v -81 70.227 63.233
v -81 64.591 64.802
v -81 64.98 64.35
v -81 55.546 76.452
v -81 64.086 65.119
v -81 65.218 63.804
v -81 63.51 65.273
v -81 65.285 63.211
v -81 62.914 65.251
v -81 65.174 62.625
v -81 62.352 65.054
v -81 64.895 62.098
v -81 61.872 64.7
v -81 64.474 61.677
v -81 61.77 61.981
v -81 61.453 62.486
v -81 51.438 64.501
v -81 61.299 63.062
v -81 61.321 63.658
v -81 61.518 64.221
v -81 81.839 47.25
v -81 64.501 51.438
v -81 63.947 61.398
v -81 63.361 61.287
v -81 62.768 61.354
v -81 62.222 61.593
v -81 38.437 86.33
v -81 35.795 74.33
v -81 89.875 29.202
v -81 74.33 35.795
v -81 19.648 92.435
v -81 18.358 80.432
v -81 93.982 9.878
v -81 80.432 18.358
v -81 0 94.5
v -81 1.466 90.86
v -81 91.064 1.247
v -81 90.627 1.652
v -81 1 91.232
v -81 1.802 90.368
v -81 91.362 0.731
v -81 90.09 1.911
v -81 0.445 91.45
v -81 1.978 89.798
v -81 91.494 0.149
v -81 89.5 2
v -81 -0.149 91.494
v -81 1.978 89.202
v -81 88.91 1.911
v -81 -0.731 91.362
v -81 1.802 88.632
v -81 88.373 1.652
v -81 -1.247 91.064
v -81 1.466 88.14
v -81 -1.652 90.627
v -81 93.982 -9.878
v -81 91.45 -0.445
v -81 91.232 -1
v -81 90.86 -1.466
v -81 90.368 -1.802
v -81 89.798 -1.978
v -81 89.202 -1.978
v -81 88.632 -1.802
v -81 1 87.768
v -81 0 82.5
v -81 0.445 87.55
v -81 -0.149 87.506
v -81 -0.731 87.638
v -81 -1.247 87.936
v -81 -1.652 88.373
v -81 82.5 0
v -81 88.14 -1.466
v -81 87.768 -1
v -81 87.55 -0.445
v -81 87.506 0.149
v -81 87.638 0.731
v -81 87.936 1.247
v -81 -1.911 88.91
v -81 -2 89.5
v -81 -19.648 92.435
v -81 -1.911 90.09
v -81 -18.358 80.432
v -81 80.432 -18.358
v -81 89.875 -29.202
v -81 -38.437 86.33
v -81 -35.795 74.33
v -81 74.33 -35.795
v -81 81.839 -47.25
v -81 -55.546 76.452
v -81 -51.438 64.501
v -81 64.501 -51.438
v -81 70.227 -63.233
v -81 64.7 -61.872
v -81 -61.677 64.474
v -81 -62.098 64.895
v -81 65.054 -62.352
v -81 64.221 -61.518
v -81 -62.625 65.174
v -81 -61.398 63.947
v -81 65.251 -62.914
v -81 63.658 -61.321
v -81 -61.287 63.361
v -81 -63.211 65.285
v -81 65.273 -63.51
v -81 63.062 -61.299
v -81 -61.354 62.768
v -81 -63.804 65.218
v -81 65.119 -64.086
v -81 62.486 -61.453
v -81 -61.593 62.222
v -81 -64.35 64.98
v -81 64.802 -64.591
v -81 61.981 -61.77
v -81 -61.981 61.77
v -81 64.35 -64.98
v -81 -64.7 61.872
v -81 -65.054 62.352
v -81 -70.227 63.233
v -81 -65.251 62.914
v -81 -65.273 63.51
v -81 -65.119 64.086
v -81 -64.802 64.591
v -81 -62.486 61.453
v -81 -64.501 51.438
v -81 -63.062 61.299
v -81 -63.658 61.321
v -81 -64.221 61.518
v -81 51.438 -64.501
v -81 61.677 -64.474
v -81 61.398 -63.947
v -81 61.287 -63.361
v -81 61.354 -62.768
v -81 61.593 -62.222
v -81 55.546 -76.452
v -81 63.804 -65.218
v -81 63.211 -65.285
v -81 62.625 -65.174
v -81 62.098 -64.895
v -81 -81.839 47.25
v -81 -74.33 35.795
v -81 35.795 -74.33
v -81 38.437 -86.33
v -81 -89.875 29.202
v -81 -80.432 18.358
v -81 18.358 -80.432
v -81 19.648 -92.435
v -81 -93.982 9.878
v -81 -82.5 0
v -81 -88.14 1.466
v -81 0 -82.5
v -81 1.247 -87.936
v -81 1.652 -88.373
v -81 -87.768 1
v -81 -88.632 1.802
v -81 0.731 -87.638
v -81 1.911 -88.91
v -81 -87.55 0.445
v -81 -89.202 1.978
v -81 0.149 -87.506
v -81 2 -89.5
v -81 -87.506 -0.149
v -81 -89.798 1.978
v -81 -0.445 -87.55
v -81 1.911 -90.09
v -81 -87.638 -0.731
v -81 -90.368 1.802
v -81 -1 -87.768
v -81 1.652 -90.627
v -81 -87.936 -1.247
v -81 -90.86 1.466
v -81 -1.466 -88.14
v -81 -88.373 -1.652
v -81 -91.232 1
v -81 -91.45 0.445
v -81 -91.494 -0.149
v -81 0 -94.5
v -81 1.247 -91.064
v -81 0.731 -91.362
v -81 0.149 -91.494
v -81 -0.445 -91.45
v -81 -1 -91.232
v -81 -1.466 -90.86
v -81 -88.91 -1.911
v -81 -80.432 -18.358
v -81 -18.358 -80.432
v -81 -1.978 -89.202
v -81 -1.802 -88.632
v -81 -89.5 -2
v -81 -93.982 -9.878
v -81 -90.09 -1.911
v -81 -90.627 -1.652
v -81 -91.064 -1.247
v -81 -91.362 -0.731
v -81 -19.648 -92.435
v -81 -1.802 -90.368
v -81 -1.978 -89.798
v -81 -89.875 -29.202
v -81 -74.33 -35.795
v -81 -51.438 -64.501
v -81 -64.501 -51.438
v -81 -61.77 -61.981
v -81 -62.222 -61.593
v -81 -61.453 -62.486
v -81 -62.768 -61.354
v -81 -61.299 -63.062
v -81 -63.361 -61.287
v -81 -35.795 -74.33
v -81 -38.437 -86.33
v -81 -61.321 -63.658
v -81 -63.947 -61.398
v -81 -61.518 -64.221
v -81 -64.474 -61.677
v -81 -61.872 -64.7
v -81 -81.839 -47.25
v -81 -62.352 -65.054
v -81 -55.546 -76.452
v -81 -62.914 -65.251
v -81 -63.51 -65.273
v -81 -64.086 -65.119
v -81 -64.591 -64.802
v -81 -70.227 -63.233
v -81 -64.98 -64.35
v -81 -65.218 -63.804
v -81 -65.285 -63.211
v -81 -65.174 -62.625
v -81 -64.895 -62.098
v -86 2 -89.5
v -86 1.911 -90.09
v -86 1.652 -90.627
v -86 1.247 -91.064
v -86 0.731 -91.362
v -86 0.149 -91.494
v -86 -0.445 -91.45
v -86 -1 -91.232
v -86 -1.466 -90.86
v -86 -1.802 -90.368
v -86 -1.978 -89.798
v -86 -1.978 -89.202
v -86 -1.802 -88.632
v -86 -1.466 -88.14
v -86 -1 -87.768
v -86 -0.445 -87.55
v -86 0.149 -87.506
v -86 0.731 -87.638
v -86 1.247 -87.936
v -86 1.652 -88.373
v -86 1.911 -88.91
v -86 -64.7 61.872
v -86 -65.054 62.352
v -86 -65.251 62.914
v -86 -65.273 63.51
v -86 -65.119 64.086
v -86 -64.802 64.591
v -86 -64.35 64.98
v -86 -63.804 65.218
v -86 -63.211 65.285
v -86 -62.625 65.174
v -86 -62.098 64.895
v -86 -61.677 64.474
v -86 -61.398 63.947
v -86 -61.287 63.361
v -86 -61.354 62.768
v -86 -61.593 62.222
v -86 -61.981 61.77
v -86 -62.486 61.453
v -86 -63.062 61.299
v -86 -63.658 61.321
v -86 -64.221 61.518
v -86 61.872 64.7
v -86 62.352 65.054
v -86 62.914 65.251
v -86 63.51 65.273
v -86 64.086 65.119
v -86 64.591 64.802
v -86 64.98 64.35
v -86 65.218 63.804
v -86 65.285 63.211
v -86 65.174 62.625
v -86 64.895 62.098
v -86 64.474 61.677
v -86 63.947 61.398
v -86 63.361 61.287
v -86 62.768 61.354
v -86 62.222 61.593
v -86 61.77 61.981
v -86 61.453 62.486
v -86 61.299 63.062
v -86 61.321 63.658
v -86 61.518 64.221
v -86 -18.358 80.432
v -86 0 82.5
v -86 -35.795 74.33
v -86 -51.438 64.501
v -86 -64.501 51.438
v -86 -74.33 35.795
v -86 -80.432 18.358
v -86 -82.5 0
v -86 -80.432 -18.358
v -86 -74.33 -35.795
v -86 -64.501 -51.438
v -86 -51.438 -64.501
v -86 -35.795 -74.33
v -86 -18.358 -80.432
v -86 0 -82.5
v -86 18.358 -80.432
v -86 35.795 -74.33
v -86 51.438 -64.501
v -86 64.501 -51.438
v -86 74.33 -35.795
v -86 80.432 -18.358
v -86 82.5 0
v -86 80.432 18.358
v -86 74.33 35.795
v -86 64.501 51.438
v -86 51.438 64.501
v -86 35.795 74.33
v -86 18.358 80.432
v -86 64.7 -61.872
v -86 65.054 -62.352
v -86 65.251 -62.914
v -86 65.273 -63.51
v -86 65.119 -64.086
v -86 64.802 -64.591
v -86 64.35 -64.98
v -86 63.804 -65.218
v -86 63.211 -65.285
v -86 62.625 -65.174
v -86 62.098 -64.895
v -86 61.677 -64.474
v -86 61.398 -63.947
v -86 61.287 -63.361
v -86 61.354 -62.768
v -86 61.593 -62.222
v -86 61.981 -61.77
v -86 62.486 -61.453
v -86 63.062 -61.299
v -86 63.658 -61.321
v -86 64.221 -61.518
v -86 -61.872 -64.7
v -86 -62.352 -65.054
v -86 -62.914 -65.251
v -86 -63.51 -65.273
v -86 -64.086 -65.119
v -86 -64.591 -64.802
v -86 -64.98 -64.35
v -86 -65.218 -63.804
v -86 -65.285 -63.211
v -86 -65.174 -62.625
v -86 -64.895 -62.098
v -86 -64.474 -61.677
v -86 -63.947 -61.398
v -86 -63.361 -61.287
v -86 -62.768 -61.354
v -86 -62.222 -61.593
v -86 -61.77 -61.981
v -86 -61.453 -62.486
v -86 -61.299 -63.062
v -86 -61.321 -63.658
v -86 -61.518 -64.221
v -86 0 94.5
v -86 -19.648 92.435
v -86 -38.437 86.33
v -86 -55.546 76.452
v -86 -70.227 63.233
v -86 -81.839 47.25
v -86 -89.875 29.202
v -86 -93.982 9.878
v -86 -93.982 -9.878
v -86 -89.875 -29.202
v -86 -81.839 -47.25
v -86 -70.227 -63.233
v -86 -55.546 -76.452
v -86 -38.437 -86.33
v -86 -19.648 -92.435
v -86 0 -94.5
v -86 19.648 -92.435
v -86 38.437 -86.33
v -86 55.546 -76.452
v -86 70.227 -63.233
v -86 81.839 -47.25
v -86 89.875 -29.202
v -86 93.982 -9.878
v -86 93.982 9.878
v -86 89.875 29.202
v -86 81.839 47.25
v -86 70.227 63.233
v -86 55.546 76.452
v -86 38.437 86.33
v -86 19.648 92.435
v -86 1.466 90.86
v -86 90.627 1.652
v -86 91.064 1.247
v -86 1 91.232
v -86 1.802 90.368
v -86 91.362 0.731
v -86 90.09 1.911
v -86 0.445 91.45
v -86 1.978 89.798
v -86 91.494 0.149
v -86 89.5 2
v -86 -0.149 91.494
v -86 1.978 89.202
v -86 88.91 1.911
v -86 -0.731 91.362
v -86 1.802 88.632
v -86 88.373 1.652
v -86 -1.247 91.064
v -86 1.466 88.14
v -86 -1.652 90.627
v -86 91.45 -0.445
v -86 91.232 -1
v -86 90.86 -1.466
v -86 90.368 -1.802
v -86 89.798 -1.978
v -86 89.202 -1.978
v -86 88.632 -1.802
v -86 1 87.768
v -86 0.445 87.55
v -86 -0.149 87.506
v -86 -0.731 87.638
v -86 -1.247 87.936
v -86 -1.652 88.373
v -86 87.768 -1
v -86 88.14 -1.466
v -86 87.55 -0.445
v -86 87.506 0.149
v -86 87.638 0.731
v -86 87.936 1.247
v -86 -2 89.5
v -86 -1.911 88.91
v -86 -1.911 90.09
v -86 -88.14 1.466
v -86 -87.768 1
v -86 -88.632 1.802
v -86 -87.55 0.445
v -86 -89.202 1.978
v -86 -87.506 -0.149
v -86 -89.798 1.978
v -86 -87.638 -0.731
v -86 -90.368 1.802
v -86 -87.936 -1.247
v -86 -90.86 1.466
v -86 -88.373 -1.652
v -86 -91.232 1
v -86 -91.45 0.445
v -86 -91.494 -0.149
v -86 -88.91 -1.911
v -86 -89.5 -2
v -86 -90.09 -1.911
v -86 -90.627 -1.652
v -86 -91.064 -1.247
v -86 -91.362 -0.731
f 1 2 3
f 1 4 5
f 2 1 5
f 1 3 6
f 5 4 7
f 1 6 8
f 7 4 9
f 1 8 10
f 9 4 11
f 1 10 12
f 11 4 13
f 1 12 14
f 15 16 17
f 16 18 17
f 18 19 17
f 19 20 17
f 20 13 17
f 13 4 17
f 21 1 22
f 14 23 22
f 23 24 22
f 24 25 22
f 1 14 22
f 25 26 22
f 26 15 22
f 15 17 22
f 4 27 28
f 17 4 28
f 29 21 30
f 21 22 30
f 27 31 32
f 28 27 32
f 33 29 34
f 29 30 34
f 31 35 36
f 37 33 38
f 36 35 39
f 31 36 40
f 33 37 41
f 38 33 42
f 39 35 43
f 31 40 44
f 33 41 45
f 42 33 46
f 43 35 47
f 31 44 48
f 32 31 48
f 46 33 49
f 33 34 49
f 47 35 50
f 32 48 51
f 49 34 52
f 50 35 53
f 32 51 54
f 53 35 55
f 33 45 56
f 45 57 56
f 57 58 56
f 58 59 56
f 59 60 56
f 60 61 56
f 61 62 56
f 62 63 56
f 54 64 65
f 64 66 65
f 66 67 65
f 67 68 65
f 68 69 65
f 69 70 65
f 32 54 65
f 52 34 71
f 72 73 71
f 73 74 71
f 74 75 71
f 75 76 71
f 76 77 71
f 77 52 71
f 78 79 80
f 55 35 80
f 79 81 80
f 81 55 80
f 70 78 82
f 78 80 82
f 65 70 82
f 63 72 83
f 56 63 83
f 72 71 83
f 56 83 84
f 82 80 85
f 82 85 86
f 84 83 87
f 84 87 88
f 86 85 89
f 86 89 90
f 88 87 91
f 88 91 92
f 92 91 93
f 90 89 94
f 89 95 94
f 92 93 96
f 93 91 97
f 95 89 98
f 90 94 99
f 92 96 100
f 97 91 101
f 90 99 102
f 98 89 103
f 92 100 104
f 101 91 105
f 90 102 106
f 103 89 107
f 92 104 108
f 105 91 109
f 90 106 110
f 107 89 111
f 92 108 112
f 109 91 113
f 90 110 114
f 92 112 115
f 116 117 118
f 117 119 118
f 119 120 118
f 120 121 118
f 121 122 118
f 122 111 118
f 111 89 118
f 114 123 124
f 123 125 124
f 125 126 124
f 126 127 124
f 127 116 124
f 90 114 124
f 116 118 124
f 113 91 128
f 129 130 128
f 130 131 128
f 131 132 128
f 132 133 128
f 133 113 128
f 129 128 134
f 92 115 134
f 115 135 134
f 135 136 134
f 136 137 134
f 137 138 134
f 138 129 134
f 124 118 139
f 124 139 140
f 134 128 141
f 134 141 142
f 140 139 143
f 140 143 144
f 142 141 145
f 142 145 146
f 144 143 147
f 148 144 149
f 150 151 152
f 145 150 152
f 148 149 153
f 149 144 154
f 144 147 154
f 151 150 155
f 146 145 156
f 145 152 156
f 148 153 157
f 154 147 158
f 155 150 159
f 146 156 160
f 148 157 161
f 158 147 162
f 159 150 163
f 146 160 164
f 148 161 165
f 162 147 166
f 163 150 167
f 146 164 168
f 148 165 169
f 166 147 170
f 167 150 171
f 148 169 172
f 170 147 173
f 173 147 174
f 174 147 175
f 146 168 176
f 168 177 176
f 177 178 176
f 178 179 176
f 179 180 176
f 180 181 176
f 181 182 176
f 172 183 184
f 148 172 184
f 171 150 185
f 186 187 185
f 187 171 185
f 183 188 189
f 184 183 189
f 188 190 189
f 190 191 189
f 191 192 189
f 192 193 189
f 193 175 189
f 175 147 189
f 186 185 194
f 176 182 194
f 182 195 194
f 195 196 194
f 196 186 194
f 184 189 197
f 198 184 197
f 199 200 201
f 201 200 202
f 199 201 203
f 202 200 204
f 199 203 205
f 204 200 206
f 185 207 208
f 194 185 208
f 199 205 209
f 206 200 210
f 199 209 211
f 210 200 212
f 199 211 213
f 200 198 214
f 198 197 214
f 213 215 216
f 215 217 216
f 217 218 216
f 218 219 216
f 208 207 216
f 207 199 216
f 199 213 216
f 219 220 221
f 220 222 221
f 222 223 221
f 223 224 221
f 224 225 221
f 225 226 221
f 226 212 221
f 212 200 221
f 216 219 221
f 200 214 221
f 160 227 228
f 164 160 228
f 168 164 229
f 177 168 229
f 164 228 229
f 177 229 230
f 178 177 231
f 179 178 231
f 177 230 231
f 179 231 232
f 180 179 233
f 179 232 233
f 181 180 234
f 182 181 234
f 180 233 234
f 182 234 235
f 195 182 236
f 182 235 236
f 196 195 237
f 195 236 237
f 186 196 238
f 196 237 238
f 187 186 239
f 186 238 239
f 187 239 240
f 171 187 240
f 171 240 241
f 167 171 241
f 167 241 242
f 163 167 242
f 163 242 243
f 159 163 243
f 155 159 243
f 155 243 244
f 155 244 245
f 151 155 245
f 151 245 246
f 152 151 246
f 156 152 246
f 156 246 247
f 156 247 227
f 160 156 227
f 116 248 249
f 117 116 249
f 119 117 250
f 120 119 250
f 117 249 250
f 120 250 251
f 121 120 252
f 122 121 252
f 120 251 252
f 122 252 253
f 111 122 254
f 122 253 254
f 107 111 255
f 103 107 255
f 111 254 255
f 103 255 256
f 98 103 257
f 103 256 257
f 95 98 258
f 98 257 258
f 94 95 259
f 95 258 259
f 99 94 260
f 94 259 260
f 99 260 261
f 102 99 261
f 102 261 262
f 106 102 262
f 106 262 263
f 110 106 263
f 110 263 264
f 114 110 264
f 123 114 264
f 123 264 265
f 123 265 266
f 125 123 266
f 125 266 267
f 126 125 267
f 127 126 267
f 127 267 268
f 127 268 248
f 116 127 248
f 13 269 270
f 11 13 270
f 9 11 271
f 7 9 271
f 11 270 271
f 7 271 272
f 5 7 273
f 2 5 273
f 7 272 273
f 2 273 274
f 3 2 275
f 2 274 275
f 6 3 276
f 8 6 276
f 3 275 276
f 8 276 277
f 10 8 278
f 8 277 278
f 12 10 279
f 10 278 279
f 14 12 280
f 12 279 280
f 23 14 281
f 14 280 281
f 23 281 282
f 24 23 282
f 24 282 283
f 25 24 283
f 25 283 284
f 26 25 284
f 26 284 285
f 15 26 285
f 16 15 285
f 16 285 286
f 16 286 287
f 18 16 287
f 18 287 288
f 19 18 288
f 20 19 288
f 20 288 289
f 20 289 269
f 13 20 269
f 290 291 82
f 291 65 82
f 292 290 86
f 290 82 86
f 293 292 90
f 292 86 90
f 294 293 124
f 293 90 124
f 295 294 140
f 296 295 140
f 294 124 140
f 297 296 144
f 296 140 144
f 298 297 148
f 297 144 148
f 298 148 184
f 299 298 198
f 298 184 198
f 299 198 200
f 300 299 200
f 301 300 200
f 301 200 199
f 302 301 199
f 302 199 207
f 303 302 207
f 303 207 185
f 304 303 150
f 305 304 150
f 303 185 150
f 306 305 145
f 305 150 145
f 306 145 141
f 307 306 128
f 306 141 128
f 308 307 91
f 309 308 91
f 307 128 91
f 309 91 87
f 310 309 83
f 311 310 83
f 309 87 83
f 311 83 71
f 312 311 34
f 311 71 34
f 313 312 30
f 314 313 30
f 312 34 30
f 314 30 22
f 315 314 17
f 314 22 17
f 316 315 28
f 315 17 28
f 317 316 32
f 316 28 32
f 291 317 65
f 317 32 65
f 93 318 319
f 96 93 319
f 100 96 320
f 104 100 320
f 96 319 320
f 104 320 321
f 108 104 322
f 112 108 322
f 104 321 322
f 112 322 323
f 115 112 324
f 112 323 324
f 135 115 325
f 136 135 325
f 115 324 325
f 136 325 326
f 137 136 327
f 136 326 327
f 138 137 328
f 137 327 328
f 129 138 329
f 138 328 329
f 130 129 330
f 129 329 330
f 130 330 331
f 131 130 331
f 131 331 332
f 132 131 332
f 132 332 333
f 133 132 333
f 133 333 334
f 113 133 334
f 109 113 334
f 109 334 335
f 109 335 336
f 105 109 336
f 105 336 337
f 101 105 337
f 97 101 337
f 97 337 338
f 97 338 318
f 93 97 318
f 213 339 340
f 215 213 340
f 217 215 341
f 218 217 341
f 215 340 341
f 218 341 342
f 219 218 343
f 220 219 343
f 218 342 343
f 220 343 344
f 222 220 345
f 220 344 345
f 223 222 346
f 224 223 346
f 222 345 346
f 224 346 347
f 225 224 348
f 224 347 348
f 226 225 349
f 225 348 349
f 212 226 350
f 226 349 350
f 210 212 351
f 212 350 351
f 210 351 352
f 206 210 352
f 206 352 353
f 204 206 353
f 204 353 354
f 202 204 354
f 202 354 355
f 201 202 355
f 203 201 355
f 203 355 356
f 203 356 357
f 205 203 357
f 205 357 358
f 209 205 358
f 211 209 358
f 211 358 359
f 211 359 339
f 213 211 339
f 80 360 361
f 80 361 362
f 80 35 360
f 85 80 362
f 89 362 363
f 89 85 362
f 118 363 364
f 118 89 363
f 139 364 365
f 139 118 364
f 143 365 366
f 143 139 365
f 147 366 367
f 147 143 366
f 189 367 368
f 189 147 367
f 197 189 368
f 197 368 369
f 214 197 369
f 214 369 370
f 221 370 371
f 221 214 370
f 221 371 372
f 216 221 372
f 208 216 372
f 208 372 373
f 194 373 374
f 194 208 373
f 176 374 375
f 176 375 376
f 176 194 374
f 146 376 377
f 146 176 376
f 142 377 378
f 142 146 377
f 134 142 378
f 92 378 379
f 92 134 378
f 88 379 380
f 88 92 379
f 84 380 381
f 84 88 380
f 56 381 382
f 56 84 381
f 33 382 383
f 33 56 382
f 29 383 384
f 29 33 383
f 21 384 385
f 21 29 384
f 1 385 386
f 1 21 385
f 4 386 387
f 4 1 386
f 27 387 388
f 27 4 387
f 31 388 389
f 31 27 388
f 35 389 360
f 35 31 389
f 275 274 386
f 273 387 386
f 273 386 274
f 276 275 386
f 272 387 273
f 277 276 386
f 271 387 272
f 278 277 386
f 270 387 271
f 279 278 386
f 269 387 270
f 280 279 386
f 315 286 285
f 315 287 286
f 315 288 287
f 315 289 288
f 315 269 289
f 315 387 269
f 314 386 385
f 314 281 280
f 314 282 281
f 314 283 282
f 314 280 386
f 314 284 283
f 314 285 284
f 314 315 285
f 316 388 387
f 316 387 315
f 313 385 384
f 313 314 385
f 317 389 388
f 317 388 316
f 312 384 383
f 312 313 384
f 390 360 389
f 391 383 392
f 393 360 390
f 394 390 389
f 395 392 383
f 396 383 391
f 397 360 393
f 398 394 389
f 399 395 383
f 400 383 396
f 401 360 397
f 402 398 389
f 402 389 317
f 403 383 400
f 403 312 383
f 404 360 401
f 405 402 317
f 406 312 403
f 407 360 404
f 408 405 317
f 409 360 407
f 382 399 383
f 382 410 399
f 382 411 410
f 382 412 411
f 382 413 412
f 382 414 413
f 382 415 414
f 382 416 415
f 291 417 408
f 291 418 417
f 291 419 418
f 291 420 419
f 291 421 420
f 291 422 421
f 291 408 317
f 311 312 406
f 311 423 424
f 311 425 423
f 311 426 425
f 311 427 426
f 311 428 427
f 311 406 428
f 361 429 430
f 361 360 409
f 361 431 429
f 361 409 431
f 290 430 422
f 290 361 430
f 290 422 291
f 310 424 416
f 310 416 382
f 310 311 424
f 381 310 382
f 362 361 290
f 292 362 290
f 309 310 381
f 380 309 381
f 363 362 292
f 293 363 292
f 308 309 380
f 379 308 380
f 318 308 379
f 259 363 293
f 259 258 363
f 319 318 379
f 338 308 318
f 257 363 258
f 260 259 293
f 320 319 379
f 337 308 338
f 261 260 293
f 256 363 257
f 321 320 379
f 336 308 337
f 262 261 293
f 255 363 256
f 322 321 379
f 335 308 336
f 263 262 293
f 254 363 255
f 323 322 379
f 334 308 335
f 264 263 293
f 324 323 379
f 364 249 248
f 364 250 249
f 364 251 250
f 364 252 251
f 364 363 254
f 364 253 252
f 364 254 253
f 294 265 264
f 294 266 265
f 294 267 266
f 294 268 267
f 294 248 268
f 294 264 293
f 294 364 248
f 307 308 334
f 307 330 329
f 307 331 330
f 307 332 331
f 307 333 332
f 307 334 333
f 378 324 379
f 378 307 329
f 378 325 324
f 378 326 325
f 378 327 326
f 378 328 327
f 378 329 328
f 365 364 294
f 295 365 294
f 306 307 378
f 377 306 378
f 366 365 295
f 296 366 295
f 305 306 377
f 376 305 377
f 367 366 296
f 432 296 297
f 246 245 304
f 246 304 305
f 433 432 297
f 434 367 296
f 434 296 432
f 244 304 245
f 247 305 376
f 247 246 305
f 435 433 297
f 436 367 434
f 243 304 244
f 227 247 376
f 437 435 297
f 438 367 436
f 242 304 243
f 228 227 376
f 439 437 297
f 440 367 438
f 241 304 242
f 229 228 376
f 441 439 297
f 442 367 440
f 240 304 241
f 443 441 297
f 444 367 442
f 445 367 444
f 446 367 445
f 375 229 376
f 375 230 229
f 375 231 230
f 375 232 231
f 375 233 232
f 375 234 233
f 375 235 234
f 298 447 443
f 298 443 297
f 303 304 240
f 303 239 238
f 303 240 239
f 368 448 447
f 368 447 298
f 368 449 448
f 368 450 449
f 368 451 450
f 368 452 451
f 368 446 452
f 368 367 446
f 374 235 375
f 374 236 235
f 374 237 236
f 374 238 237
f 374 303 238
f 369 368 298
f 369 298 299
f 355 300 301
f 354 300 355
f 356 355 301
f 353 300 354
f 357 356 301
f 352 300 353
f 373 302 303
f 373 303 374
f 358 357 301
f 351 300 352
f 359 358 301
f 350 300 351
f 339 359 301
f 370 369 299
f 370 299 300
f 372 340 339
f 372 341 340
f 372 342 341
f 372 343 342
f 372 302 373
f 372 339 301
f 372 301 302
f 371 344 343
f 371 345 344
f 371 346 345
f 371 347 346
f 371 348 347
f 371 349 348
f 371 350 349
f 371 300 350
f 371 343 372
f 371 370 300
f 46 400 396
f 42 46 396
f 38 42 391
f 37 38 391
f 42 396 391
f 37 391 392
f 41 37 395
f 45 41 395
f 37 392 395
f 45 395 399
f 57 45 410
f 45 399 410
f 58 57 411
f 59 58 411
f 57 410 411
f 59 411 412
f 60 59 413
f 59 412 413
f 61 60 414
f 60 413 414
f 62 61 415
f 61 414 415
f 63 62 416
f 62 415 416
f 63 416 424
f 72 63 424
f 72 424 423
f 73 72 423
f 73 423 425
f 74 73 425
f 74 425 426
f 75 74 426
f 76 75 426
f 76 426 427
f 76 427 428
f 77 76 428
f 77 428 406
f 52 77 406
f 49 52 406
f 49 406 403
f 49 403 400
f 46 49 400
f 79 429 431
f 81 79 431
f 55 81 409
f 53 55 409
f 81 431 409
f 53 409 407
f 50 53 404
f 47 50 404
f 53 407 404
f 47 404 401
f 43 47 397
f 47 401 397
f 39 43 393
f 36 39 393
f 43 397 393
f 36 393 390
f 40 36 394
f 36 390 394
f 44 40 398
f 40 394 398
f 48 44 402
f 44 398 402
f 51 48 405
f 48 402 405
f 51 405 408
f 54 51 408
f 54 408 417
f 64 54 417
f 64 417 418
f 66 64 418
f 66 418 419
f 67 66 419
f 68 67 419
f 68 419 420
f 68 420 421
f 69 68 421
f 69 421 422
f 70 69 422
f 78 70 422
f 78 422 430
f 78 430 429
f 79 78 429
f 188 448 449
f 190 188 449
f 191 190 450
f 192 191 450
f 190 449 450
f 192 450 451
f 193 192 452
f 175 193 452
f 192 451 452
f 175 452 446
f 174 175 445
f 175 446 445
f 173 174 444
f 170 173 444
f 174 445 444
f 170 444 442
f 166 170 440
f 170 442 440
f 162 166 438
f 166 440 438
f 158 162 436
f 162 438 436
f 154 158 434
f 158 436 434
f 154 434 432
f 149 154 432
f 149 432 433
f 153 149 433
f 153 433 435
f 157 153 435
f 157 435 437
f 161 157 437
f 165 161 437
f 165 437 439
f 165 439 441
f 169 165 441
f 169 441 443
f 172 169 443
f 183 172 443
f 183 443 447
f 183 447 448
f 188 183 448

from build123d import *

# Parameters (mm, degrees)
SKETCH1_W          = 5
SKETCH1_H          = 12
SKETCH2_R          = 2
CUT_EXTRUDE1_DEPTH = 30
CIRPATTERN1_COUNT  = 8


with BuildPart() as part:
    # Sketch1 → Revolve1 (revolve)
    with BuildSketch(Plane.XY, mode=Mode.PRIVATE) as revolve1_sk:
        with Locations((-83.5, 88.5)):
            Rectangle(SKETCH1_W, SKETCH1_H)
    revolve(revolve1_sk.sketch.rotate(Axis((-206.017932179, 0, 0), (1, 0, 0)), 90), axis=Axis((-206.017932179, 0, 0), (1, 0, 0)))

    # Sketch2 → Cut-Extrude1 (cut)
    with BuildSketch(Plane.ZY.offset(86)):
        with Locations((0, 89.5)):
            Circle(SKETCH2_R)
    cut_extrude1 = extrude(amount=-CUT_EXTRUDE1_DEPTH, mode=Mode.SUBTRACT)

    # CirPattern1: Cut-Extrude1 ×8 about axis
    cirpattern1_axis = Axis((0, 0, 0), (1, 0, 0))
    for i in range(1, CIRPATTERN1_COUNT):
        add(cut_extrude1.rotate(cirpattern1_axis, i * 360 / CIRPATTERN1_COUNT), mode=Mode.SUBTRACT)


solid = part.part
